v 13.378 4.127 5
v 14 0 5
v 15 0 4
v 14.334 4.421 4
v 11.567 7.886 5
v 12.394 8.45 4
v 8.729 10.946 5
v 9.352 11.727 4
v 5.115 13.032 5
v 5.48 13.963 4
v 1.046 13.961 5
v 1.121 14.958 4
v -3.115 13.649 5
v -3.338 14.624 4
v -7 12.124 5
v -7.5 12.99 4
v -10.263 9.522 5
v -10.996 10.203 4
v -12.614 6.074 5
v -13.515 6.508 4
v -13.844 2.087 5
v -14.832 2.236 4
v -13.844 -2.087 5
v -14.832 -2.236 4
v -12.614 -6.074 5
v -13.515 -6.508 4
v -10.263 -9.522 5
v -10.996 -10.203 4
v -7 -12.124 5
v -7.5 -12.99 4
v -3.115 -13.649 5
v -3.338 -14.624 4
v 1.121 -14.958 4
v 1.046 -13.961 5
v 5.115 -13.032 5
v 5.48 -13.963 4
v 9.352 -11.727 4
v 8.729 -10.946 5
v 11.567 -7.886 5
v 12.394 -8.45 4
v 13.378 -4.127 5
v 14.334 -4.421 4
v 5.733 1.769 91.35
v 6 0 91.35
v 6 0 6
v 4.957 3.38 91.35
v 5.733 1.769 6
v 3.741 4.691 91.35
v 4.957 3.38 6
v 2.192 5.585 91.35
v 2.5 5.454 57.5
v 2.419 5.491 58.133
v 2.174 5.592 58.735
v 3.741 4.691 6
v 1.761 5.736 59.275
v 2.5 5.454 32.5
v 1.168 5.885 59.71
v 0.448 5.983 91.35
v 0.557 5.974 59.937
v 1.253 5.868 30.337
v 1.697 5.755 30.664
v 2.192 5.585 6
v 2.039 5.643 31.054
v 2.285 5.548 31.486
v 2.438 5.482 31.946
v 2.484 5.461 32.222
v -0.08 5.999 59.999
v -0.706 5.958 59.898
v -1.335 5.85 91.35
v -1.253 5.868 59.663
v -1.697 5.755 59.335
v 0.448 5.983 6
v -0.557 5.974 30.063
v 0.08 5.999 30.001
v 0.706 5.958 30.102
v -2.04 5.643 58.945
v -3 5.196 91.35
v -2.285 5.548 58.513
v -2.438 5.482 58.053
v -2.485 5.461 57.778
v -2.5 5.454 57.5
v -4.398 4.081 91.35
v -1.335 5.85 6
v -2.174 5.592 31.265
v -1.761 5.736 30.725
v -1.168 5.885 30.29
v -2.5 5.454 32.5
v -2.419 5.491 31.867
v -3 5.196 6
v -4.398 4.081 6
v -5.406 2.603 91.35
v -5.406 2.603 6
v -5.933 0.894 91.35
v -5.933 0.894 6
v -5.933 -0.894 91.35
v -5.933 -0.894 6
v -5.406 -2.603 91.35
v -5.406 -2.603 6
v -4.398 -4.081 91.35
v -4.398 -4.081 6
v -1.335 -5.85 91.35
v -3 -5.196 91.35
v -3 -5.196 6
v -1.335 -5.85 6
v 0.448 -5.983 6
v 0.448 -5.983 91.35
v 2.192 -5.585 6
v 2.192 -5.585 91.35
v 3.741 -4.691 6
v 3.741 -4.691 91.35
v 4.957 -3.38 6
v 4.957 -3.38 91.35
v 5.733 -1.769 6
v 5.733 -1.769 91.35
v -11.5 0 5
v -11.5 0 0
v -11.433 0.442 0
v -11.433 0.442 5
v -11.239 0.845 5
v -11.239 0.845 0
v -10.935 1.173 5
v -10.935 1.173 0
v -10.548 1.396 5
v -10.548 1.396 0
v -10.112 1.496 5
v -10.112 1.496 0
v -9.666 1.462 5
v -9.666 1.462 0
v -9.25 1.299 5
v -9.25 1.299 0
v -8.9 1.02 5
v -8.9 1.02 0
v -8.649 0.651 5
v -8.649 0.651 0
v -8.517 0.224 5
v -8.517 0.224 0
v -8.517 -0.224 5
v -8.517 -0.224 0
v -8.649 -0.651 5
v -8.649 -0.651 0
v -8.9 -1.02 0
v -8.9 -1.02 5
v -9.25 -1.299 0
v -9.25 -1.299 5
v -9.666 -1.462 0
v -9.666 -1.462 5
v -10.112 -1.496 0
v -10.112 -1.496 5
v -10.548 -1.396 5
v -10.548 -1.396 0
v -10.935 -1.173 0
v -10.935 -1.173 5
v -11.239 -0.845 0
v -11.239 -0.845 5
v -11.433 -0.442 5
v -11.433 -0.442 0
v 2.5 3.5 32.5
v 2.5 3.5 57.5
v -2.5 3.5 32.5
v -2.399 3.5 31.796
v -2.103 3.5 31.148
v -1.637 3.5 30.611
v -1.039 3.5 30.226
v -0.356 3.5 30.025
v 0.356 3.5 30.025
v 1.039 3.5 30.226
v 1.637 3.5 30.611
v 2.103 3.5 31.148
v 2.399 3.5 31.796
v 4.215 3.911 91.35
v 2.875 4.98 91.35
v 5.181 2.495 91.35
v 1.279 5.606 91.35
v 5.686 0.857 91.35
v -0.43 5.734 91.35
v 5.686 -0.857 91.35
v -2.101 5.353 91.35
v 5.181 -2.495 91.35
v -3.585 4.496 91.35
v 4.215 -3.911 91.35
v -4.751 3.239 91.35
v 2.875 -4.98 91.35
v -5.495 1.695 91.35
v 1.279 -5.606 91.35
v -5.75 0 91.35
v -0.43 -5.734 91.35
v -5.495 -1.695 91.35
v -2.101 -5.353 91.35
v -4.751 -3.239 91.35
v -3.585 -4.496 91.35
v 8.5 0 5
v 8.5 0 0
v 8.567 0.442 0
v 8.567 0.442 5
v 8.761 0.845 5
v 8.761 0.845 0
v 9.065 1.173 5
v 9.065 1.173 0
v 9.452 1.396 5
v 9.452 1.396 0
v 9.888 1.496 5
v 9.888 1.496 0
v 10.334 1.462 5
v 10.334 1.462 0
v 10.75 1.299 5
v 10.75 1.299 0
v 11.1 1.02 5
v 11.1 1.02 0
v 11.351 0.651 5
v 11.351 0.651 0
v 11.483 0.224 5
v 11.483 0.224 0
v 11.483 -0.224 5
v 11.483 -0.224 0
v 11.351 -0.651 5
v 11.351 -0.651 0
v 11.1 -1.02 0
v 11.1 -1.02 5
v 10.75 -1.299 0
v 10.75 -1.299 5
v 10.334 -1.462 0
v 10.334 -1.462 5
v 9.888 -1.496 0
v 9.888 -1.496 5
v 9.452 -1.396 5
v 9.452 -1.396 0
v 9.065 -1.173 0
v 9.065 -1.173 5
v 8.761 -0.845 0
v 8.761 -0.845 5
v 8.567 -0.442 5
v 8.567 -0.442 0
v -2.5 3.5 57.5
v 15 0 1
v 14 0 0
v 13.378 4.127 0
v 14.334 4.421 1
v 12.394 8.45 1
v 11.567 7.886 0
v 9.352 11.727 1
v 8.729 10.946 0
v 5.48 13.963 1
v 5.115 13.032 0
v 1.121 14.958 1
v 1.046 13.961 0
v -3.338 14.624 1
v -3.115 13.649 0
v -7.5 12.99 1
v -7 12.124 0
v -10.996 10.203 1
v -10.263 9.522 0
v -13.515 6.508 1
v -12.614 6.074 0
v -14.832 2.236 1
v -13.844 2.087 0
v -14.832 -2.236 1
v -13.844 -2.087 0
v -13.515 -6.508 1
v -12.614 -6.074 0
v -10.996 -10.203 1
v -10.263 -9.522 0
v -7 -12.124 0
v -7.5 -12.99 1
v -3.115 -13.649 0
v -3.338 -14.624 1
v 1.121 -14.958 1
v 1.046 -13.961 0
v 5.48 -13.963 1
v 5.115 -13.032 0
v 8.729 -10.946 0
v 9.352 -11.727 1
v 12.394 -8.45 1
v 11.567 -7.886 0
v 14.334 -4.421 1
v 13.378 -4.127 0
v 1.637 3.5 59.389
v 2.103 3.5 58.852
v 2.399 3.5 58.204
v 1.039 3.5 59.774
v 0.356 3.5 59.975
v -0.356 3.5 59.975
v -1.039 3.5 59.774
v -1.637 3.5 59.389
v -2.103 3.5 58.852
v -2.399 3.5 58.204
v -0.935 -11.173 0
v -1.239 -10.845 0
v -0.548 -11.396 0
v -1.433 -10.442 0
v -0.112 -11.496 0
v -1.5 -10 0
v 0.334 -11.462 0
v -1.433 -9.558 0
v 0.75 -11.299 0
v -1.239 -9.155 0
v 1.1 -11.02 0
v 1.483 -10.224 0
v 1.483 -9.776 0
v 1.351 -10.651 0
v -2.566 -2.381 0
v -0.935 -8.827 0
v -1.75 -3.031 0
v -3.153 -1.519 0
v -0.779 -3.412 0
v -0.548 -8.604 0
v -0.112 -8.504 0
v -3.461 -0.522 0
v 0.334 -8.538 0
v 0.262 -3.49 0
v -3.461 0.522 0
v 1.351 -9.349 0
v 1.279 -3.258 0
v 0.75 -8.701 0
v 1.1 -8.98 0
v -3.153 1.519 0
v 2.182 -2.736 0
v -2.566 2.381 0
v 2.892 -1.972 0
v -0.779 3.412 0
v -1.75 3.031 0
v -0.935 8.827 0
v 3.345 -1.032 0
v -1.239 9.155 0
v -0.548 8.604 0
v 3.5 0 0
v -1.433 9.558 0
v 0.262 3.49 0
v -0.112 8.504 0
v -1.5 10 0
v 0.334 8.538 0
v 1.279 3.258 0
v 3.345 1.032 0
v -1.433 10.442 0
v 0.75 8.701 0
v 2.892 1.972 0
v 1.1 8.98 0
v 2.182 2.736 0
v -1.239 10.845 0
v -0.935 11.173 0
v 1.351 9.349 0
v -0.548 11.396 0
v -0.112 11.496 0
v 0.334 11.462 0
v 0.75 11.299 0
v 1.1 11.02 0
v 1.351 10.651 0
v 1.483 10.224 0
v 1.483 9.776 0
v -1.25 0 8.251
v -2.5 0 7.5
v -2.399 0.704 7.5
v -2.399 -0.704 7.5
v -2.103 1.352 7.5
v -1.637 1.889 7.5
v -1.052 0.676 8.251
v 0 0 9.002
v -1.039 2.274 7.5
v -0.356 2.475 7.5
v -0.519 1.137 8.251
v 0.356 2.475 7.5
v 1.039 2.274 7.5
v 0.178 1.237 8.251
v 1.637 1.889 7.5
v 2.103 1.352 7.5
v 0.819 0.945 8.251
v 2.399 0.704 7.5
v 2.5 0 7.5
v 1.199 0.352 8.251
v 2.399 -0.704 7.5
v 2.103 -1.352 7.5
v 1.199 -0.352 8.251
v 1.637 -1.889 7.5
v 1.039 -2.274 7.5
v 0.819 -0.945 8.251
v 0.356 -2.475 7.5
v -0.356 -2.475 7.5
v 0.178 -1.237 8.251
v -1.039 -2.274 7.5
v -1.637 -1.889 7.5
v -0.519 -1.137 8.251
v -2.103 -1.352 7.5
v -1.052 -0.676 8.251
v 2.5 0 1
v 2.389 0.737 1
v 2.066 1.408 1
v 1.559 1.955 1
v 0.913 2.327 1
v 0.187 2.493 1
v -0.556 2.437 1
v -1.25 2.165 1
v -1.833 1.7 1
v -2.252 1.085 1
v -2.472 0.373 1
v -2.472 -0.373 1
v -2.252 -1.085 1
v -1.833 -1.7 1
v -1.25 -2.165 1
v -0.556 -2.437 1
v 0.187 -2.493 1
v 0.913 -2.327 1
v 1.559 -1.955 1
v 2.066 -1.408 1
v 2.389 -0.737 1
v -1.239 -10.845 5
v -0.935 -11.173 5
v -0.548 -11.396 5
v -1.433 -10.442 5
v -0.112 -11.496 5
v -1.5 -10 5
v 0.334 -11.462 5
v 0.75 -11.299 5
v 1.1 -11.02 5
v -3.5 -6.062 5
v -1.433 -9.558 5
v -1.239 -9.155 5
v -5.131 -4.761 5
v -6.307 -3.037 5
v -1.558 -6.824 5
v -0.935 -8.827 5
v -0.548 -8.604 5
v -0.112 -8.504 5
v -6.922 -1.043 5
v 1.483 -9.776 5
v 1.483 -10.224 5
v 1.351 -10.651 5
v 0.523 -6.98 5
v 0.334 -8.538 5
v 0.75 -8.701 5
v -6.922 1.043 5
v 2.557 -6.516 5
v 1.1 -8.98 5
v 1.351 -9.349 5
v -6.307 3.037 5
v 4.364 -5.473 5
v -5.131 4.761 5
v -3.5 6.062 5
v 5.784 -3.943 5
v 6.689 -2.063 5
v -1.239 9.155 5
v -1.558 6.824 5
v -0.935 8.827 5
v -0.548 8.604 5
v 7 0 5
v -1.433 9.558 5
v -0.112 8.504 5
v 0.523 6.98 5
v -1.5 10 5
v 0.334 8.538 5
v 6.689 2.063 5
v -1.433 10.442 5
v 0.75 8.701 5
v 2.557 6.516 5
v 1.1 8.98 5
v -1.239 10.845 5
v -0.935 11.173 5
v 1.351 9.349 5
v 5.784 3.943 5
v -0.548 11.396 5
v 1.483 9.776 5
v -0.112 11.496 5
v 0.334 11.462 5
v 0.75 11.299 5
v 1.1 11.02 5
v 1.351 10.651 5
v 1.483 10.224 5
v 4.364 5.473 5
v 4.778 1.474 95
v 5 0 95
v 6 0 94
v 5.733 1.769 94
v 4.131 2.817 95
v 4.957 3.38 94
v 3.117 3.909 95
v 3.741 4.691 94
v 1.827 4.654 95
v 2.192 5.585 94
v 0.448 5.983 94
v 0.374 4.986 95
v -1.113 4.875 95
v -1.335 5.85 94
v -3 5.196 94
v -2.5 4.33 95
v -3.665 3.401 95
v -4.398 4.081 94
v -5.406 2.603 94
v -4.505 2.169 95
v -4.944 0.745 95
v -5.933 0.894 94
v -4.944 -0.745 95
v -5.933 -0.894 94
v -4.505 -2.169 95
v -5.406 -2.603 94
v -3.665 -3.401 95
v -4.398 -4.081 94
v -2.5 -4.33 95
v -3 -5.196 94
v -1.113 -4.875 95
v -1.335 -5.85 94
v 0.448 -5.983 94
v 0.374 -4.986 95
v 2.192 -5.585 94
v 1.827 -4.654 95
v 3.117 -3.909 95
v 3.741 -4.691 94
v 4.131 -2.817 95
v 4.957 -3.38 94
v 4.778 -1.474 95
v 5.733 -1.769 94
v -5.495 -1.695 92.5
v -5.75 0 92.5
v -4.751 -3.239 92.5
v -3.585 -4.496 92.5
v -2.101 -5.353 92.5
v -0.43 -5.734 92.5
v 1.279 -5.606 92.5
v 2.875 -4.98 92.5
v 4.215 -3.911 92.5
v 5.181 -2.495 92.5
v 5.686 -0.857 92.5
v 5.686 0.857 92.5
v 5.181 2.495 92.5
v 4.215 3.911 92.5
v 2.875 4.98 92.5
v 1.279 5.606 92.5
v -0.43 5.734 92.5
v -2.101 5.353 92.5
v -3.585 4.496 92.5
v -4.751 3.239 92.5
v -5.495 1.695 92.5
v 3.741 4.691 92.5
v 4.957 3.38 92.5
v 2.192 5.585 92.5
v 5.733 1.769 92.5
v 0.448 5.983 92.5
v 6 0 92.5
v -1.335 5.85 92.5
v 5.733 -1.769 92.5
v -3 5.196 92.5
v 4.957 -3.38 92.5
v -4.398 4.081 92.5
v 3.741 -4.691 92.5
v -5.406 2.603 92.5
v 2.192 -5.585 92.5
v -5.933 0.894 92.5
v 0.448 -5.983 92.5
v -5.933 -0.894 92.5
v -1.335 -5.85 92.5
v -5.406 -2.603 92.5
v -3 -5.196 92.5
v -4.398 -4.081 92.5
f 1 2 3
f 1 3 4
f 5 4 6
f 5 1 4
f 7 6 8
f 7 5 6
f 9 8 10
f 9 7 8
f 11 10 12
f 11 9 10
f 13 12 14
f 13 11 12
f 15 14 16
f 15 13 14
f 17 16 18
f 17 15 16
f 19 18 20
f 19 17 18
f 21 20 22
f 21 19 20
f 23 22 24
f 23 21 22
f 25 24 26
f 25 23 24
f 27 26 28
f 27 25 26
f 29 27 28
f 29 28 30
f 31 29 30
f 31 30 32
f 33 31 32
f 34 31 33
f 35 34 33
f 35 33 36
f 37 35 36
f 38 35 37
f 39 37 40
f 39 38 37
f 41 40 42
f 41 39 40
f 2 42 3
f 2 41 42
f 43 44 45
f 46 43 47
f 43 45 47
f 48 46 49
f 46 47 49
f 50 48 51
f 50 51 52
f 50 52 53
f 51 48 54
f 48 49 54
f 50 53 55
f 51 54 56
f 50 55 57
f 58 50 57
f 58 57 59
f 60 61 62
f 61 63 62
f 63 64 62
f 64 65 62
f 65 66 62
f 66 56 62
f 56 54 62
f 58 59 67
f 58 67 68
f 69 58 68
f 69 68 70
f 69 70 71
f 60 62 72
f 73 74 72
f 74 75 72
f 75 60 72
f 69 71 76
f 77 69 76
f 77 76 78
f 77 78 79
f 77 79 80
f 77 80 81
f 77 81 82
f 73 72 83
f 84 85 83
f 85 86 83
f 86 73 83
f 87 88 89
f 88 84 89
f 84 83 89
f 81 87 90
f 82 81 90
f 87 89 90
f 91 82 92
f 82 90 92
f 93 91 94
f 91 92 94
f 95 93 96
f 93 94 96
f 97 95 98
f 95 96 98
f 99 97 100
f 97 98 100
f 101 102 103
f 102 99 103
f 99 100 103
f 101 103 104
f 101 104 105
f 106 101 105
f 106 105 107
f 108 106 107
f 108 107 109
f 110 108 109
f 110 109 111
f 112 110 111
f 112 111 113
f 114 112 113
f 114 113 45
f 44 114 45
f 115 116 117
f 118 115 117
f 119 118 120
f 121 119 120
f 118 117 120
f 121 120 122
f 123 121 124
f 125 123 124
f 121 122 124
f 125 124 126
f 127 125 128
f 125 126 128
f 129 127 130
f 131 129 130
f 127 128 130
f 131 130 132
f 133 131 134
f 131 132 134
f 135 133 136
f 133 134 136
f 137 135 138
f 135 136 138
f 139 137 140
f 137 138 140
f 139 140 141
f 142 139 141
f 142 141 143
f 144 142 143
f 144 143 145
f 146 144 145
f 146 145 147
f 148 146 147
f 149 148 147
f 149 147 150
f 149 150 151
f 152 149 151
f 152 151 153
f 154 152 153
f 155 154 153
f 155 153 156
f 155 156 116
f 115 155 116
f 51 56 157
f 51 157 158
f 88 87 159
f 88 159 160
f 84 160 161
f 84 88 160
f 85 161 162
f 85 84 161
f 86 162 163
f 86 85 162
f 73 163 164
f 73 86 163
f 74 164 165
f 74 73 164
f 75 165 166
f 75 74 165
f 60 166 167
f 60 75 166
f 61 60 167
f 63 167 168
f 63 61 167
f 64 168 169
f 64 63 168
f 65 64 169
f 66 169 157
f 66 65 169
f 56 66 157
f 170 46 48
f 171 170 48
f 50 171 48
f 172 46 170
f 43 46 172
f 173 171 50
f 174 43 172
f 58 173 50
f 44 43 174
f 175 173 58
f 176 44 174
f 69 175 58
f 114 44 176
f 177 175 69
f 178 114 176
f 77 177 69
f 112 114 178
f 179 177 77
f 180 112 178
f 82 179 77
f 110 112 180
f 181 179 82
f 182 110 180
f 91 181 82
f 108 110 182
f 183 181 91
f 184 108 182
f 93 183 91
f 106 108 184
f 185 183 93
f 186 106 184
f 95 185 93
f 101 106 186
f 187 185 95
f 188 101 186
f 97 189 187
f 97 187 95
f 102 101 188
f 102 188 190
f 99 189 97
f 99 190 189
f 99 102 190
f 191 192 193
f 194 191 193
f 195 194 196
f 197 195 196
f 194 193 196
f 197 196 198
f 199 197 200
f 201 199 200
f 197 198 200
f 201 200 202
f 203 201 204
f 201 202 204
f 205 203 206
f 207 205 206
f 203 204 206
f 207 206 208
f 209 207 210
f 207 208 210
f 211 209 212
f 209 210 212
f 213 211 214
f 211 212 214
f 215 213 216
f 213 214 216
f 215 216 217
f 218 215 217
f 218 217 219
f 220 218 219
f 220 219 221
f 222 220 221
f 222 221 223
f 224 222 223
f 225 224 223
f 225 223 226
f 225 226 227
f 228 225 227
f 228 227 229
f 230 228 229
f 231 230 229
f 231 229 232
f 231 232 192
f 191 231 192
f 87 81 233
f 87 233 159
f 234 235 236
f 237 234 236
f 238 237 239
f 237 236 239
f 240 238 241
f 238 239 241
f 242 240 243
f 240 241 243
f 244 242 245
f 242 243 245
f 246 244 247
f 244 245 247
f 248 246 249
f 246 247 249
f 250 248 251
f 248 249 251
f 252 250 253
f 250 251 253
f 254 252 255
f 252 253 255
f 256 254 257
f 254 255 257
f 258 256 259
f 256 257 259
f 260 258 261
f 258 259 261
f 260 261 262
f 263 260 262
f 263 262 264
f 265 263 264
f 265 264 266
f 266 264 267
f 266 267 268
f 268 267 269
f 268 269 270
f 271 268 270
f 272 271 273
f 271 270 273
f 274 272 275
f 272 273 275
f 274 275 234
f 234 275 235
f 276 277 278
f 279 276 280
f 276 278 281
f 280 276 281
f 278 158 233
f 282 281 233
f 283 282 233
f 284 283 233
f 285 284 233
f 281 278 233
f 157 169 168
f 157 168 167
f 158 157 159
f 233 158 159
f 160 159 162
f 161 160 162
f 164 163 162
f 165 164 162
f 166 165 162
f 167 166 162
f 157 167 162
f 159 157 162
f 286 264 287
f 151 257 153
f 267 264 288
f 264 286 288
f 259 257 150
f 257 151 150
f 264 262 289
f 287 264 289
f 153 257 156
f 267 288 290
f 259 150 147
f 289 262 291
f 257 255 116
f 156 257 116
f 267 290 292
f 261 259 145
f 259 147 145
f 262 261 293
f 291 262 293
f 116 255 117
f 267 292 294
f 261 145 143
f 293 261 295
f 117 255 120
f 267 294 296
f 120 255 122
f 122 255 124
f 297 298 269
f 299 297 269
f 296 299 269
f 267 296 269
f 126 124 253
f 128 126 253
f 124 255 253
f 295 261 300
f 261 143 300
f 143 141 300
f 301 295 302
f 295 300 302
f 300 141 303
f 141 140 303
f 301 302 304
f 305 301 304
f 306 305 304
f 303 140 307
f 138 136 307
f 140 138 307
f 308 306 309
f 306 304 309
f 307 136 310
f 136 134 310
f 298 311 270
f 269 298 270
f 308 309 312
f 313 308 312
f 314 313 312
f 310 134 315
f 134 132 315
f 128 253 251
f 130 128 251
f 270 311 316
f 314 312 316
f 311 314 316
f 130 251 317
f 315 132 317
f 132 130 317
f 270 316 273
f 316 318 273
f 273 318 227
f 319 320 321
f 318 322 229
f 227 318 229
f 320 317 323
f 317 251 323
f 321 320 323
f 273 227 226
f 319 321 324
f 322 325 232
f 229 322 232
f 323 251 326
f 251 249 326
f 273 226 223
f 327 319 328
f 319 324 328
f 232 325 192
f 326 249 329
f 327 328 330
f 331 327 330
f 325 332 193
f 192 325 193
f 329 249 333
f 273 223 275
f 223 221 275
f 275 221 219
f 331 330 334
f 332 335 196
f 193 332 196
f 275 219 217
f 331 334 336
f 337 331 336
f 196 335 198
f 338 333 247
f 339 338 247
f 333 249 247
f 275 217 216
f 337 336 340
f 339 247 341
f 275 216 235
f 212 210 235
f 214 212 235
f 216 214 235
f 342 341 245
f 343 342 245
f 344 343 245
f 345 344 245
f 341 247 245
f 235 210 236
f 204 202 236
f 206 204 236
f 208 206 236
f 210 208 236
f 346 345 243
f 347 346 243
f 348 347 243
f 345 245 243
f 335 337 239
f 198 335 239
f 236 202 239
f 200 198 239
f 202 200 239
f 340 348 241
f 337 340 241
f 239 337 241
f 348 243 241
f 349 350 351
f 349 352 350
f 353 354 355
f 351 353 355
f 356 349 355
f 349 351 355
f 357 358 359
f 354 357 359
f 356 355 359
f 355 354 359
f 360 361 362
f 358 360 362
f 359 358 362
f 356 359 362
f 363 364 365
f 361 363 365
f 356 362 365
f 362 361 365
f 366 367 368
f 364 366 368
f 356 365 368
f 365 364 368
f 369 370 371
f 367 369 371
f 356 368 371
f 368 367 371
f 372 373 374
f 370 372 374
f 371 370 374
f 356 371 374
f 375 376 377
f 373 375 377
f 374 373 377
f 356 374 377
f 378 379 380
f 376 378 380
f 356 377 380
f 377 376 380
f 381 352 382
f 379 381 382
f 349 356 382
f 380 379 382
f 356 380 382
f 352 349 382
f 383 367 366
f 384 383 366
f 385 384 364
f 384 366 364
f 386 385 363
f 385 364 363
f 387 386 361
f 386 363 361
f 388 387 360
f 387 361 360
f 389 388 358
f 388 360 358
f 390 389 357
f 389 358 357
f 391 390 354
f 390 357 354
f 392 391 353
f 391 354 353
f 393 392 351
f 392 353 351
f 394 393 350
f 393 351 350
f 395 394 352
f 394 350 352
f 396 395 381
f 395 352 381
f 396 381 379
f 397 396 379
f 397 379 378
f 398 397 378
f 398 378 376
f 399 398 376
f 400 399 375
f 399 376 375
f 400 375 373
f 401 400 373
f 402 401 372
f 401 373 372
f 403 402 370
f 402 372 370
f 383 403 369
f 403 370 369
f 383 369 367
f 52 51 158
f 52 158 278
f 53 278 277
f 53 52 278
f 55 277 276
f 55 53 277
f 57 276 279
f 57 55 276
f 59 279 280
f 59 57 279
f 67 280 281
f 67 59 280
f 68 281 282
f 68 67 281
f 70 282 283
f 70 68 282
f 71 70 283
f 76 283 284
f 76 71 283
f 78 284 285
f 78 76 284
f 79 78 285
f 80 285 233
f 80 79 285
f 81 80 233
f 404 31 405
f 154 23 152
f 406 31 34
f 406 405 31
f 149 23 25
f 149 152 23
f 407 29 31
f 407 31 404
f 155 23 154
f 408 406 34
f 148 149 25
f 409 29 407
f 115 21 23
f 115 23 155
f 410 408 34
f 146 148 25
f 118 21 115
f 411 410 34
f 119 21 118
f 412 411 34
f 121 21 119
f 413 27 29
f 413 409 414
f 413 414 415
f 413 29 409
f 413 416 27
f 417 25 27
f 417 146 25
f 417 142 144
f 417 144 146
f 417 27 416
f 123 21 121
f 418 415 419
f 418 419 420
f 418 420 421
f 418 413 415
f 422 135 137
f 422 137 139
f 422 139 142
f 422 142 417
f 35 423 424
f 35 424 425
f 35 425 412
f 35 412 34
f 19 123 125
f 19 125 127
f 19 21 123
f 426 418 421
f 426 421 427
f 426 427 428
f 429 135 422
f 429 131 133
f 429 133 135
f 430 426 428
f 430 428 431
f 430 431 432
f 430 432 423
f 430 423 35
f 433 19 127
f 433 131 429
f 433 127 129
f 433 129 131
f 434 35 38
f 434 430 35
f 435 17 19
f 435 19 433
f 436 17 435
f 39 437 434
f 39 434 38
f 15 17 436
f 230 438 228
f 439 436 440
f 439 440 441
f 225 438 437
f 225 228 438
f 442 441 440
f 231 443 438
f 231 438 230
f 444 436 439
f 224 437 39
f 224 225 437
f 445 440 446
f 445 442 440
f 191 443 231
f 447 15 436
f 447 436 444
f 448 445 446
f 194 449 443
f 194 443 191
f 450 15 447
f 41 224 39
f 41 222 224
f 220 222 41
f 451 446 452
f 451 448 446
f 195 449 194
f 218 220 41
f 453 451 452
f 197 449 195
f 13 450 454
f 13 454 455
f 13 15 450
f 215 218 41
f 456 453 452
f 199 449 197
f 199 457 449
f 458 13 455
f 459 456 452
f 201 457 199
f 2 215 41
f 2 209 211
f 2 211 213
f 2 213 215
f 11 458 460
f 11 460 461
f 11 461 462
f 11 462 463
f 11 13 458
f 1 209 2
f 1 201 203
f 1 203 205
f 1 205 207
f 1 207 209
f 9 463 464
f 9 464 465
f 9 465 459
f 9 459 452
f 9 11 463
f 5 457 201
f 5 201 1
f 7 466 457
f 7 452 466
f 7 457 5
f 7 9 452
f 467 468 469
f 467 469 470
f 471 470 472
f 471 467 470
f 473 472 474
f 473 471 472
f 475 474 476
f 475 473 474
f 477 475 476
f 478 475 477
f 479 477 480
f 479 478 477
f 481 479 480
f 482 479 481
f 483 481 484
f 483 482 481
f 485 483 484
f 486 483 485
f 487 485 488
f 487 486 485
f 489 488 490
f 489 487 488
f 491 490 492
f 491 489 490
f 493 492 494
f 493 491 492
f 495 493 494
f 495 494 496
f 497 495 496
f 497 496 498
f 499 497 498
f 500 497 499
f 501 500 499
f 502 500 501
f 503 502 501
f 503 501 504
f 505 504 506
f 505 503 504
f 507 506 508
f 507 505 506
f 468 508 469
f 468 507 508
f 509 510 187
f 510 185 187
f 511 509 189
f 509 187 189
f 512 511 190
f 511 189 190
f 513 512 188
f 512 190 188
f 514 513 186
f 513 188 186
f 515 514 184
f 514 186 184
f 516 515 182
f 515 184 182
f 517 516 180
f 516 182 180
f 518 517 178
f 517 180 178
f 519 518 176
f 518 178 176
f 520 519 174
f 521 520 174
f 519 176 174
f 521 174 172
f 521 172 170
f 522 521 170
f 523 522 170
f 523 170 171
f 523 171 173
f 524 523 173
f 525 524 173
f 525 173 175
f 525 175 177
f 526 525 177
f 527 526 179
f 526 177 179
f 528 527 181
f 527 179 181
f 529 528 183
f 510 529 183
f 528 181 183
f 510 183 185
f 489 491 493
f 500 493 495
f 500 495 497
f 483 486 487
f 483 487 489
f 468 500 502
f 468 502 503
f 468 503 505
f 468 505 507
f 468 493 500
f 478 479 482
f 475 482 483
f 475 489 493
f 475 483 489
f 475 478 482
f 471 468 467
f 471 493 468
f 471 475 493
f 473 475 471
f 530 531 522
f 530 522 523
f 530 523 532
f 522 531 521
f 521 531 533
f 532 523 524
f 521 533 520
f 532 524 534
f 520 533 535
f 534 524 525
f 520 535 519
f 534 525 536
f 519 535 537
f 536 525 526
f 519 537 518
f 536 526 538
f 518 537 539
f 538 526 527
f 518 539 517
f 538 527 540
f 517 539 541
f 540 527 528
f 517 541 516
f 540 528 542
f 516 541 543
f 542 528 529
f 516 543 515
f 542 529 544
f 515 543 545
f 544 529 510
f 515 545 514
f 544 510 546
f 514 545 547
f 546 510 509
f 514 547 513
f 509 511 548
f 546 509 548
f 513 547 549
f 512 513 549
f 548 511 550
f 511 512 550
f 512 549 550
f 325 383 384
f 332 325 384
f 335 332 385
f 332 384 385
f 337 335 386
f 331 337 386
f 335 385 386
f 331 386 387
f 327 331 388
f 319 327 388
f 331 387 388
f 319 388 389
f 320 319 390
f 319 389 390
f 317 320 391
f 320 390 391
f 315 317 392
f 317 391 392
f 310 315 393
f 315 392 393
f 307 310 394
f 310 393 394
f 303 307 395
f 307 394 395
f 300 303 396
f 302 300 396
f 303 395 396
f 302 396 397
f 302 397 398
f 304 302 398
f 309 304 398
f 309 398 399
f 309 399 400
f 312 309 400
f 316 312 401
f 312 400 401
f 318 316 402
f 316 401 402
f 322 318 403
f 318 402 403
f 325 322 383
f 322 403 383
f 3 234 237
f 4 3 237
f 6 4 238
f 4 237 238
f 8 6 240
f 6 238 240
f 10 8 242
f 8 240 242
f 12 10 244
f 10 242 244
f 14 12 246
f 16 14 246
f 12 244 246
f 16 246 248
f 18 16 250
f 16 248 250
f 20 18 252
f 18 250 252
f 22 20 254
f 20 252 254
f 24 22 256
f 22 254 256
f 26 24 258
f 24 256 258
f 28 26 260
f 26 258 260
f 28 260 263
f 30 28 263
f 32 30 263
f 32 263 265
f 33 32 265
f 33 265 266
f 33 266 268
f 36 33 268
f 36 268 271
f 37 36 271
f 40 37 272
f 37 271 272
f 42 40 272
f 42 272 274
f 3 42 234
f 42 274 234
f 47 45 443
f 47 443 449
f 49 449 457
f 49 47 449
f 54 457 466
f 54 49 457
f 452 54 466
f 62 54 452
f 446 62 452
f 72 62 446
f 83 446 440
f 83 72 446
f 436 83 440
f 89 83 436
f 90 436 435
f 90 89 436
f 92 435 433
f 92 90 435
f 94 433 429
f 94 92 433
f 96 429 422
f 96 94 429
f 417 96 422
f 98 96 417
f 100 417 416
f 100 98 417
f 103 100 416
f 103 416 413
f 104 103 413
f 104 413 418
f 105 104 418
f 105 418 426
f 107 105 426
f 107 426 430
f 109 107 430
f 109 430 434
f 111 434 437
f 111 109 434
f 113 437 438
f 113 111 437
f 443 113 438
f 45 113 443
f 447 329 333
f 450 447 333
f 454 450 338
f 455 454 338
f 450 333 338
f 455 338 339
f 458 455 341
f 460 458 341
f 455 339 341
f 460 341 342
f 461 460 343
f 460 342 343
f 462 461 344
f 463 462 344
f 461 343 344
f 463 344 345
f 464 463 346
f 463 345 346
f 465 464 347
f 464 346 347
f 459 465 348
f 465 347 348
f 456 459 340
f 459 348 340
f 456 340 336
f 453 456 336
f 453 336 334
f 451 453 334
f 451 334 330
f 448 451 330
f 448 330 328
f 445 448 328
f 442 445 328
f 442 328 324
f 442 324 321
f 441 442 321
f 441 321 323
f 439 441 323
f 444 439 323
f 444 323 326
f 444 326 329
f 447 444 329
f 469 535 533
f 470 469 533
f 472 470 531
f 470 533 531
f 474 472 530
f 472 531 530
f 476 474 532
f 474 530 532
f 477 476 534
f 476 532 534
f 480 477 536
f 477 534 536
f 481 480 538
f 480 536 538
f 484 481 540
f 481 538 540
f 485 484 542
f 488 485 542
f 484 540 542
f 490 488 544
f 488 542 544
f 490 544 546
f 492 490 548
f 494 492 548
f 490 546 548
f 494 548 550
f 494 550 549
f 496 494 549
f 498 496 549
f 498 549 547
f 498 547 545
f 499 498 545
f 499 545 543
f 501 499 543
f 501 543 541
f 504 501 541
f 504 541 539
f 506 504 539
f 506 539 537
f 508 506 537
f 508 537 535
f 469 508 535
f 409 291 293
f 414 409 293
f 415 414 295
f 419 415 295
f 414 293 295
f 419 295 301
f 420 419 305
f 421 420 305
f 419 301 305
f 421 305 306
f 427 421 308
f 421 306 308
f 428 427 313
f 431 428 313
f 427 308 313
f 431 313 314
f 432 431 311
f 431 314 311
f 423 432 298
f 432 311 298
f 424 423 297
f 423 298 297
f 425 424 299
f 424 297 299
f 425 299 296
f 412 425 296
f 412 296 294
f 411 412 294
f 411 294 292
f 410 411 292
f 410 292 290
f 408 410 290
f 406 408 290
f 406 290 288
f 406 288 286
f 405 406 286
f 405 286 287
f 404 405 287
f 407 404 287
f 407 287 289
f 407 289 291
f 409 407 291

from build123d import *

# Parameters (mm, degrees)
SKETCH1_R                 = 15
BOSS_EXTRUDE1_DEPTH       = 5
SKETCH4_R                 = 1.5
CUT_EXTRUDE2_DEPTH        = 1
CUT_EXTRUDE2_DEPTH_BACK   = 6
SKETCH6_R                 = 6
BOSS_EXTRUDE2_DEPTH       = 90
CHAMFER1_SIZE             = 1
CUT_EXTRUDE3_DEPTH        = 2.5
SKETCH8_W                 = 0.25
SKETCH8_H                 = 1.15
F_5_0MM_DOWEL_HOLE1_D     = 5
F_5_0MM_DOWEL_HOLE1_DEPTH = 7.5
F_5_0MM_DOWEL_HOLE1_TIP   = 1.502151548
CHAMFER2_SIZE             = 1


with BuildPart() as part:
    # Sketch1 → Boss-Extrude1 (new body)
    with BuildSketch(Plane.XY):
        Circle(SKETCH1_R)
    extrude(amount=BOSS_EXTRUDE1_DEPTH)

    # Sketch4 → Cut-Extrude2 (cut, two sides)
    with BuildSketch(Plane(origin=(0, 0, 0), x_dir=(-1, 0, 0), z_dir=(0, 0, -1))) as cut_extrude2_sk:
        with Locations((10, 0)):
            Circle(SKETCH4_R)
        with Locations((0, -10)):
            Circle(SKETCH4_R)
        with Locations((-10, 0)):
            Circle(SKETCH4_R)
        with Locations((0, 10)):
            Circle(SKETCH4_R)
    extrude(amount=CUT_EXTRUDE2_DEPTH, mode=Mode.SUBTRACT)
    extrude(cut_extrude2_sk.sketch, amount=-CUT_EXTRUDE2_DEPTH_BACK, mode=Mode.SUBTRACT)

    # Sketch6 → Boss-Extrude2 (add)
    with BuildSketch(Plane.XY.offset(5)):
        Circle(SKETCH6_R)
    extrude(amount=BOSS_EXTRUDE2_DEPTH)

    # Chamfer1
    chamfer1_edges = [part.edges().sort_by_distance(p)[0] for p in [
        (-15, 0, 0),
        (-6, 0, 5),
        (-6, 0, 95),
        (-15, 0, 5),
    ]]
    chamfer(chamfer1_edges, length=CHAMFER1_SIZE)

    # Sketch7 → Cut-Extrude3 (cut)
    with BuildSketch(Plane(origin=(0, 6, 0), x_dir=(1, 0, 0), z_dir=(0, 1, 0))):
        with BuildLine():
            Line((-2.5, -57.5), (-2.5, -32.5))
            ThreePointArc((-2.5, -32.5), (0, -30), (2.5, -32.5))
            Line((2.5, -32.5), (2.5, -57.5))
            ThreePointArc((2.5, -57.5), (0, -60), (-2.5, -57.5))
        make_face()
    extrude(amount=-CUT_EXTRUDE3_DEPTH, mode=Mode.SUBTRACT)

    # Sketch8 → Cut-Revolve1 (revolve, cut)
    with BuildSketch(Plane(origin=(0, 0, 0), x_dir=(1, 0, 0), z_dir=(0, 1, 0))):
        with Locations((-5.875, -91.925)):
            Rectangle(SKETCH8_W, SKETCH8_H)
    revolve(axis=Axis((0, 0, 0), (0, 0, 1)), mode=Mode.SUBTRACT)

    # Ø5.0mm Dowel Hole1
    with Locations(Plane(origin=(0, 0, 0), x_dir=(-1, 0, 0), z_dir=(0, 0, -1))):
        with Locations((0, 0)):
            Hole(F_5_0MM_DOWEL_HOLE1_D / 2, depth=F_5_0MM_DOWEL_HOLE1_DEPTH)
            with Locations((0, 0, -(F_5_0MM_DOWEL_HOLE1_DEPTH + F_5_0MM_DOWEL_HOLE1_TIP / 2))):  # 118° drill point
                Cone(0, F_5_0MM_DOWEL_HOLE1_D / 2, F_5_0MM_DOWEL_HOLE1_TIP, mode=Mode.SUBTRACT)

    # Chamfer2
    chamfer2_edges = [part.edges().sort_by_distance(p)[0] for p in [
        (-2.5, 0, 0),
    ]]
    chamfer(chamfer2_edges, length=CHAMFER2_SIZE)


solid = part.part
